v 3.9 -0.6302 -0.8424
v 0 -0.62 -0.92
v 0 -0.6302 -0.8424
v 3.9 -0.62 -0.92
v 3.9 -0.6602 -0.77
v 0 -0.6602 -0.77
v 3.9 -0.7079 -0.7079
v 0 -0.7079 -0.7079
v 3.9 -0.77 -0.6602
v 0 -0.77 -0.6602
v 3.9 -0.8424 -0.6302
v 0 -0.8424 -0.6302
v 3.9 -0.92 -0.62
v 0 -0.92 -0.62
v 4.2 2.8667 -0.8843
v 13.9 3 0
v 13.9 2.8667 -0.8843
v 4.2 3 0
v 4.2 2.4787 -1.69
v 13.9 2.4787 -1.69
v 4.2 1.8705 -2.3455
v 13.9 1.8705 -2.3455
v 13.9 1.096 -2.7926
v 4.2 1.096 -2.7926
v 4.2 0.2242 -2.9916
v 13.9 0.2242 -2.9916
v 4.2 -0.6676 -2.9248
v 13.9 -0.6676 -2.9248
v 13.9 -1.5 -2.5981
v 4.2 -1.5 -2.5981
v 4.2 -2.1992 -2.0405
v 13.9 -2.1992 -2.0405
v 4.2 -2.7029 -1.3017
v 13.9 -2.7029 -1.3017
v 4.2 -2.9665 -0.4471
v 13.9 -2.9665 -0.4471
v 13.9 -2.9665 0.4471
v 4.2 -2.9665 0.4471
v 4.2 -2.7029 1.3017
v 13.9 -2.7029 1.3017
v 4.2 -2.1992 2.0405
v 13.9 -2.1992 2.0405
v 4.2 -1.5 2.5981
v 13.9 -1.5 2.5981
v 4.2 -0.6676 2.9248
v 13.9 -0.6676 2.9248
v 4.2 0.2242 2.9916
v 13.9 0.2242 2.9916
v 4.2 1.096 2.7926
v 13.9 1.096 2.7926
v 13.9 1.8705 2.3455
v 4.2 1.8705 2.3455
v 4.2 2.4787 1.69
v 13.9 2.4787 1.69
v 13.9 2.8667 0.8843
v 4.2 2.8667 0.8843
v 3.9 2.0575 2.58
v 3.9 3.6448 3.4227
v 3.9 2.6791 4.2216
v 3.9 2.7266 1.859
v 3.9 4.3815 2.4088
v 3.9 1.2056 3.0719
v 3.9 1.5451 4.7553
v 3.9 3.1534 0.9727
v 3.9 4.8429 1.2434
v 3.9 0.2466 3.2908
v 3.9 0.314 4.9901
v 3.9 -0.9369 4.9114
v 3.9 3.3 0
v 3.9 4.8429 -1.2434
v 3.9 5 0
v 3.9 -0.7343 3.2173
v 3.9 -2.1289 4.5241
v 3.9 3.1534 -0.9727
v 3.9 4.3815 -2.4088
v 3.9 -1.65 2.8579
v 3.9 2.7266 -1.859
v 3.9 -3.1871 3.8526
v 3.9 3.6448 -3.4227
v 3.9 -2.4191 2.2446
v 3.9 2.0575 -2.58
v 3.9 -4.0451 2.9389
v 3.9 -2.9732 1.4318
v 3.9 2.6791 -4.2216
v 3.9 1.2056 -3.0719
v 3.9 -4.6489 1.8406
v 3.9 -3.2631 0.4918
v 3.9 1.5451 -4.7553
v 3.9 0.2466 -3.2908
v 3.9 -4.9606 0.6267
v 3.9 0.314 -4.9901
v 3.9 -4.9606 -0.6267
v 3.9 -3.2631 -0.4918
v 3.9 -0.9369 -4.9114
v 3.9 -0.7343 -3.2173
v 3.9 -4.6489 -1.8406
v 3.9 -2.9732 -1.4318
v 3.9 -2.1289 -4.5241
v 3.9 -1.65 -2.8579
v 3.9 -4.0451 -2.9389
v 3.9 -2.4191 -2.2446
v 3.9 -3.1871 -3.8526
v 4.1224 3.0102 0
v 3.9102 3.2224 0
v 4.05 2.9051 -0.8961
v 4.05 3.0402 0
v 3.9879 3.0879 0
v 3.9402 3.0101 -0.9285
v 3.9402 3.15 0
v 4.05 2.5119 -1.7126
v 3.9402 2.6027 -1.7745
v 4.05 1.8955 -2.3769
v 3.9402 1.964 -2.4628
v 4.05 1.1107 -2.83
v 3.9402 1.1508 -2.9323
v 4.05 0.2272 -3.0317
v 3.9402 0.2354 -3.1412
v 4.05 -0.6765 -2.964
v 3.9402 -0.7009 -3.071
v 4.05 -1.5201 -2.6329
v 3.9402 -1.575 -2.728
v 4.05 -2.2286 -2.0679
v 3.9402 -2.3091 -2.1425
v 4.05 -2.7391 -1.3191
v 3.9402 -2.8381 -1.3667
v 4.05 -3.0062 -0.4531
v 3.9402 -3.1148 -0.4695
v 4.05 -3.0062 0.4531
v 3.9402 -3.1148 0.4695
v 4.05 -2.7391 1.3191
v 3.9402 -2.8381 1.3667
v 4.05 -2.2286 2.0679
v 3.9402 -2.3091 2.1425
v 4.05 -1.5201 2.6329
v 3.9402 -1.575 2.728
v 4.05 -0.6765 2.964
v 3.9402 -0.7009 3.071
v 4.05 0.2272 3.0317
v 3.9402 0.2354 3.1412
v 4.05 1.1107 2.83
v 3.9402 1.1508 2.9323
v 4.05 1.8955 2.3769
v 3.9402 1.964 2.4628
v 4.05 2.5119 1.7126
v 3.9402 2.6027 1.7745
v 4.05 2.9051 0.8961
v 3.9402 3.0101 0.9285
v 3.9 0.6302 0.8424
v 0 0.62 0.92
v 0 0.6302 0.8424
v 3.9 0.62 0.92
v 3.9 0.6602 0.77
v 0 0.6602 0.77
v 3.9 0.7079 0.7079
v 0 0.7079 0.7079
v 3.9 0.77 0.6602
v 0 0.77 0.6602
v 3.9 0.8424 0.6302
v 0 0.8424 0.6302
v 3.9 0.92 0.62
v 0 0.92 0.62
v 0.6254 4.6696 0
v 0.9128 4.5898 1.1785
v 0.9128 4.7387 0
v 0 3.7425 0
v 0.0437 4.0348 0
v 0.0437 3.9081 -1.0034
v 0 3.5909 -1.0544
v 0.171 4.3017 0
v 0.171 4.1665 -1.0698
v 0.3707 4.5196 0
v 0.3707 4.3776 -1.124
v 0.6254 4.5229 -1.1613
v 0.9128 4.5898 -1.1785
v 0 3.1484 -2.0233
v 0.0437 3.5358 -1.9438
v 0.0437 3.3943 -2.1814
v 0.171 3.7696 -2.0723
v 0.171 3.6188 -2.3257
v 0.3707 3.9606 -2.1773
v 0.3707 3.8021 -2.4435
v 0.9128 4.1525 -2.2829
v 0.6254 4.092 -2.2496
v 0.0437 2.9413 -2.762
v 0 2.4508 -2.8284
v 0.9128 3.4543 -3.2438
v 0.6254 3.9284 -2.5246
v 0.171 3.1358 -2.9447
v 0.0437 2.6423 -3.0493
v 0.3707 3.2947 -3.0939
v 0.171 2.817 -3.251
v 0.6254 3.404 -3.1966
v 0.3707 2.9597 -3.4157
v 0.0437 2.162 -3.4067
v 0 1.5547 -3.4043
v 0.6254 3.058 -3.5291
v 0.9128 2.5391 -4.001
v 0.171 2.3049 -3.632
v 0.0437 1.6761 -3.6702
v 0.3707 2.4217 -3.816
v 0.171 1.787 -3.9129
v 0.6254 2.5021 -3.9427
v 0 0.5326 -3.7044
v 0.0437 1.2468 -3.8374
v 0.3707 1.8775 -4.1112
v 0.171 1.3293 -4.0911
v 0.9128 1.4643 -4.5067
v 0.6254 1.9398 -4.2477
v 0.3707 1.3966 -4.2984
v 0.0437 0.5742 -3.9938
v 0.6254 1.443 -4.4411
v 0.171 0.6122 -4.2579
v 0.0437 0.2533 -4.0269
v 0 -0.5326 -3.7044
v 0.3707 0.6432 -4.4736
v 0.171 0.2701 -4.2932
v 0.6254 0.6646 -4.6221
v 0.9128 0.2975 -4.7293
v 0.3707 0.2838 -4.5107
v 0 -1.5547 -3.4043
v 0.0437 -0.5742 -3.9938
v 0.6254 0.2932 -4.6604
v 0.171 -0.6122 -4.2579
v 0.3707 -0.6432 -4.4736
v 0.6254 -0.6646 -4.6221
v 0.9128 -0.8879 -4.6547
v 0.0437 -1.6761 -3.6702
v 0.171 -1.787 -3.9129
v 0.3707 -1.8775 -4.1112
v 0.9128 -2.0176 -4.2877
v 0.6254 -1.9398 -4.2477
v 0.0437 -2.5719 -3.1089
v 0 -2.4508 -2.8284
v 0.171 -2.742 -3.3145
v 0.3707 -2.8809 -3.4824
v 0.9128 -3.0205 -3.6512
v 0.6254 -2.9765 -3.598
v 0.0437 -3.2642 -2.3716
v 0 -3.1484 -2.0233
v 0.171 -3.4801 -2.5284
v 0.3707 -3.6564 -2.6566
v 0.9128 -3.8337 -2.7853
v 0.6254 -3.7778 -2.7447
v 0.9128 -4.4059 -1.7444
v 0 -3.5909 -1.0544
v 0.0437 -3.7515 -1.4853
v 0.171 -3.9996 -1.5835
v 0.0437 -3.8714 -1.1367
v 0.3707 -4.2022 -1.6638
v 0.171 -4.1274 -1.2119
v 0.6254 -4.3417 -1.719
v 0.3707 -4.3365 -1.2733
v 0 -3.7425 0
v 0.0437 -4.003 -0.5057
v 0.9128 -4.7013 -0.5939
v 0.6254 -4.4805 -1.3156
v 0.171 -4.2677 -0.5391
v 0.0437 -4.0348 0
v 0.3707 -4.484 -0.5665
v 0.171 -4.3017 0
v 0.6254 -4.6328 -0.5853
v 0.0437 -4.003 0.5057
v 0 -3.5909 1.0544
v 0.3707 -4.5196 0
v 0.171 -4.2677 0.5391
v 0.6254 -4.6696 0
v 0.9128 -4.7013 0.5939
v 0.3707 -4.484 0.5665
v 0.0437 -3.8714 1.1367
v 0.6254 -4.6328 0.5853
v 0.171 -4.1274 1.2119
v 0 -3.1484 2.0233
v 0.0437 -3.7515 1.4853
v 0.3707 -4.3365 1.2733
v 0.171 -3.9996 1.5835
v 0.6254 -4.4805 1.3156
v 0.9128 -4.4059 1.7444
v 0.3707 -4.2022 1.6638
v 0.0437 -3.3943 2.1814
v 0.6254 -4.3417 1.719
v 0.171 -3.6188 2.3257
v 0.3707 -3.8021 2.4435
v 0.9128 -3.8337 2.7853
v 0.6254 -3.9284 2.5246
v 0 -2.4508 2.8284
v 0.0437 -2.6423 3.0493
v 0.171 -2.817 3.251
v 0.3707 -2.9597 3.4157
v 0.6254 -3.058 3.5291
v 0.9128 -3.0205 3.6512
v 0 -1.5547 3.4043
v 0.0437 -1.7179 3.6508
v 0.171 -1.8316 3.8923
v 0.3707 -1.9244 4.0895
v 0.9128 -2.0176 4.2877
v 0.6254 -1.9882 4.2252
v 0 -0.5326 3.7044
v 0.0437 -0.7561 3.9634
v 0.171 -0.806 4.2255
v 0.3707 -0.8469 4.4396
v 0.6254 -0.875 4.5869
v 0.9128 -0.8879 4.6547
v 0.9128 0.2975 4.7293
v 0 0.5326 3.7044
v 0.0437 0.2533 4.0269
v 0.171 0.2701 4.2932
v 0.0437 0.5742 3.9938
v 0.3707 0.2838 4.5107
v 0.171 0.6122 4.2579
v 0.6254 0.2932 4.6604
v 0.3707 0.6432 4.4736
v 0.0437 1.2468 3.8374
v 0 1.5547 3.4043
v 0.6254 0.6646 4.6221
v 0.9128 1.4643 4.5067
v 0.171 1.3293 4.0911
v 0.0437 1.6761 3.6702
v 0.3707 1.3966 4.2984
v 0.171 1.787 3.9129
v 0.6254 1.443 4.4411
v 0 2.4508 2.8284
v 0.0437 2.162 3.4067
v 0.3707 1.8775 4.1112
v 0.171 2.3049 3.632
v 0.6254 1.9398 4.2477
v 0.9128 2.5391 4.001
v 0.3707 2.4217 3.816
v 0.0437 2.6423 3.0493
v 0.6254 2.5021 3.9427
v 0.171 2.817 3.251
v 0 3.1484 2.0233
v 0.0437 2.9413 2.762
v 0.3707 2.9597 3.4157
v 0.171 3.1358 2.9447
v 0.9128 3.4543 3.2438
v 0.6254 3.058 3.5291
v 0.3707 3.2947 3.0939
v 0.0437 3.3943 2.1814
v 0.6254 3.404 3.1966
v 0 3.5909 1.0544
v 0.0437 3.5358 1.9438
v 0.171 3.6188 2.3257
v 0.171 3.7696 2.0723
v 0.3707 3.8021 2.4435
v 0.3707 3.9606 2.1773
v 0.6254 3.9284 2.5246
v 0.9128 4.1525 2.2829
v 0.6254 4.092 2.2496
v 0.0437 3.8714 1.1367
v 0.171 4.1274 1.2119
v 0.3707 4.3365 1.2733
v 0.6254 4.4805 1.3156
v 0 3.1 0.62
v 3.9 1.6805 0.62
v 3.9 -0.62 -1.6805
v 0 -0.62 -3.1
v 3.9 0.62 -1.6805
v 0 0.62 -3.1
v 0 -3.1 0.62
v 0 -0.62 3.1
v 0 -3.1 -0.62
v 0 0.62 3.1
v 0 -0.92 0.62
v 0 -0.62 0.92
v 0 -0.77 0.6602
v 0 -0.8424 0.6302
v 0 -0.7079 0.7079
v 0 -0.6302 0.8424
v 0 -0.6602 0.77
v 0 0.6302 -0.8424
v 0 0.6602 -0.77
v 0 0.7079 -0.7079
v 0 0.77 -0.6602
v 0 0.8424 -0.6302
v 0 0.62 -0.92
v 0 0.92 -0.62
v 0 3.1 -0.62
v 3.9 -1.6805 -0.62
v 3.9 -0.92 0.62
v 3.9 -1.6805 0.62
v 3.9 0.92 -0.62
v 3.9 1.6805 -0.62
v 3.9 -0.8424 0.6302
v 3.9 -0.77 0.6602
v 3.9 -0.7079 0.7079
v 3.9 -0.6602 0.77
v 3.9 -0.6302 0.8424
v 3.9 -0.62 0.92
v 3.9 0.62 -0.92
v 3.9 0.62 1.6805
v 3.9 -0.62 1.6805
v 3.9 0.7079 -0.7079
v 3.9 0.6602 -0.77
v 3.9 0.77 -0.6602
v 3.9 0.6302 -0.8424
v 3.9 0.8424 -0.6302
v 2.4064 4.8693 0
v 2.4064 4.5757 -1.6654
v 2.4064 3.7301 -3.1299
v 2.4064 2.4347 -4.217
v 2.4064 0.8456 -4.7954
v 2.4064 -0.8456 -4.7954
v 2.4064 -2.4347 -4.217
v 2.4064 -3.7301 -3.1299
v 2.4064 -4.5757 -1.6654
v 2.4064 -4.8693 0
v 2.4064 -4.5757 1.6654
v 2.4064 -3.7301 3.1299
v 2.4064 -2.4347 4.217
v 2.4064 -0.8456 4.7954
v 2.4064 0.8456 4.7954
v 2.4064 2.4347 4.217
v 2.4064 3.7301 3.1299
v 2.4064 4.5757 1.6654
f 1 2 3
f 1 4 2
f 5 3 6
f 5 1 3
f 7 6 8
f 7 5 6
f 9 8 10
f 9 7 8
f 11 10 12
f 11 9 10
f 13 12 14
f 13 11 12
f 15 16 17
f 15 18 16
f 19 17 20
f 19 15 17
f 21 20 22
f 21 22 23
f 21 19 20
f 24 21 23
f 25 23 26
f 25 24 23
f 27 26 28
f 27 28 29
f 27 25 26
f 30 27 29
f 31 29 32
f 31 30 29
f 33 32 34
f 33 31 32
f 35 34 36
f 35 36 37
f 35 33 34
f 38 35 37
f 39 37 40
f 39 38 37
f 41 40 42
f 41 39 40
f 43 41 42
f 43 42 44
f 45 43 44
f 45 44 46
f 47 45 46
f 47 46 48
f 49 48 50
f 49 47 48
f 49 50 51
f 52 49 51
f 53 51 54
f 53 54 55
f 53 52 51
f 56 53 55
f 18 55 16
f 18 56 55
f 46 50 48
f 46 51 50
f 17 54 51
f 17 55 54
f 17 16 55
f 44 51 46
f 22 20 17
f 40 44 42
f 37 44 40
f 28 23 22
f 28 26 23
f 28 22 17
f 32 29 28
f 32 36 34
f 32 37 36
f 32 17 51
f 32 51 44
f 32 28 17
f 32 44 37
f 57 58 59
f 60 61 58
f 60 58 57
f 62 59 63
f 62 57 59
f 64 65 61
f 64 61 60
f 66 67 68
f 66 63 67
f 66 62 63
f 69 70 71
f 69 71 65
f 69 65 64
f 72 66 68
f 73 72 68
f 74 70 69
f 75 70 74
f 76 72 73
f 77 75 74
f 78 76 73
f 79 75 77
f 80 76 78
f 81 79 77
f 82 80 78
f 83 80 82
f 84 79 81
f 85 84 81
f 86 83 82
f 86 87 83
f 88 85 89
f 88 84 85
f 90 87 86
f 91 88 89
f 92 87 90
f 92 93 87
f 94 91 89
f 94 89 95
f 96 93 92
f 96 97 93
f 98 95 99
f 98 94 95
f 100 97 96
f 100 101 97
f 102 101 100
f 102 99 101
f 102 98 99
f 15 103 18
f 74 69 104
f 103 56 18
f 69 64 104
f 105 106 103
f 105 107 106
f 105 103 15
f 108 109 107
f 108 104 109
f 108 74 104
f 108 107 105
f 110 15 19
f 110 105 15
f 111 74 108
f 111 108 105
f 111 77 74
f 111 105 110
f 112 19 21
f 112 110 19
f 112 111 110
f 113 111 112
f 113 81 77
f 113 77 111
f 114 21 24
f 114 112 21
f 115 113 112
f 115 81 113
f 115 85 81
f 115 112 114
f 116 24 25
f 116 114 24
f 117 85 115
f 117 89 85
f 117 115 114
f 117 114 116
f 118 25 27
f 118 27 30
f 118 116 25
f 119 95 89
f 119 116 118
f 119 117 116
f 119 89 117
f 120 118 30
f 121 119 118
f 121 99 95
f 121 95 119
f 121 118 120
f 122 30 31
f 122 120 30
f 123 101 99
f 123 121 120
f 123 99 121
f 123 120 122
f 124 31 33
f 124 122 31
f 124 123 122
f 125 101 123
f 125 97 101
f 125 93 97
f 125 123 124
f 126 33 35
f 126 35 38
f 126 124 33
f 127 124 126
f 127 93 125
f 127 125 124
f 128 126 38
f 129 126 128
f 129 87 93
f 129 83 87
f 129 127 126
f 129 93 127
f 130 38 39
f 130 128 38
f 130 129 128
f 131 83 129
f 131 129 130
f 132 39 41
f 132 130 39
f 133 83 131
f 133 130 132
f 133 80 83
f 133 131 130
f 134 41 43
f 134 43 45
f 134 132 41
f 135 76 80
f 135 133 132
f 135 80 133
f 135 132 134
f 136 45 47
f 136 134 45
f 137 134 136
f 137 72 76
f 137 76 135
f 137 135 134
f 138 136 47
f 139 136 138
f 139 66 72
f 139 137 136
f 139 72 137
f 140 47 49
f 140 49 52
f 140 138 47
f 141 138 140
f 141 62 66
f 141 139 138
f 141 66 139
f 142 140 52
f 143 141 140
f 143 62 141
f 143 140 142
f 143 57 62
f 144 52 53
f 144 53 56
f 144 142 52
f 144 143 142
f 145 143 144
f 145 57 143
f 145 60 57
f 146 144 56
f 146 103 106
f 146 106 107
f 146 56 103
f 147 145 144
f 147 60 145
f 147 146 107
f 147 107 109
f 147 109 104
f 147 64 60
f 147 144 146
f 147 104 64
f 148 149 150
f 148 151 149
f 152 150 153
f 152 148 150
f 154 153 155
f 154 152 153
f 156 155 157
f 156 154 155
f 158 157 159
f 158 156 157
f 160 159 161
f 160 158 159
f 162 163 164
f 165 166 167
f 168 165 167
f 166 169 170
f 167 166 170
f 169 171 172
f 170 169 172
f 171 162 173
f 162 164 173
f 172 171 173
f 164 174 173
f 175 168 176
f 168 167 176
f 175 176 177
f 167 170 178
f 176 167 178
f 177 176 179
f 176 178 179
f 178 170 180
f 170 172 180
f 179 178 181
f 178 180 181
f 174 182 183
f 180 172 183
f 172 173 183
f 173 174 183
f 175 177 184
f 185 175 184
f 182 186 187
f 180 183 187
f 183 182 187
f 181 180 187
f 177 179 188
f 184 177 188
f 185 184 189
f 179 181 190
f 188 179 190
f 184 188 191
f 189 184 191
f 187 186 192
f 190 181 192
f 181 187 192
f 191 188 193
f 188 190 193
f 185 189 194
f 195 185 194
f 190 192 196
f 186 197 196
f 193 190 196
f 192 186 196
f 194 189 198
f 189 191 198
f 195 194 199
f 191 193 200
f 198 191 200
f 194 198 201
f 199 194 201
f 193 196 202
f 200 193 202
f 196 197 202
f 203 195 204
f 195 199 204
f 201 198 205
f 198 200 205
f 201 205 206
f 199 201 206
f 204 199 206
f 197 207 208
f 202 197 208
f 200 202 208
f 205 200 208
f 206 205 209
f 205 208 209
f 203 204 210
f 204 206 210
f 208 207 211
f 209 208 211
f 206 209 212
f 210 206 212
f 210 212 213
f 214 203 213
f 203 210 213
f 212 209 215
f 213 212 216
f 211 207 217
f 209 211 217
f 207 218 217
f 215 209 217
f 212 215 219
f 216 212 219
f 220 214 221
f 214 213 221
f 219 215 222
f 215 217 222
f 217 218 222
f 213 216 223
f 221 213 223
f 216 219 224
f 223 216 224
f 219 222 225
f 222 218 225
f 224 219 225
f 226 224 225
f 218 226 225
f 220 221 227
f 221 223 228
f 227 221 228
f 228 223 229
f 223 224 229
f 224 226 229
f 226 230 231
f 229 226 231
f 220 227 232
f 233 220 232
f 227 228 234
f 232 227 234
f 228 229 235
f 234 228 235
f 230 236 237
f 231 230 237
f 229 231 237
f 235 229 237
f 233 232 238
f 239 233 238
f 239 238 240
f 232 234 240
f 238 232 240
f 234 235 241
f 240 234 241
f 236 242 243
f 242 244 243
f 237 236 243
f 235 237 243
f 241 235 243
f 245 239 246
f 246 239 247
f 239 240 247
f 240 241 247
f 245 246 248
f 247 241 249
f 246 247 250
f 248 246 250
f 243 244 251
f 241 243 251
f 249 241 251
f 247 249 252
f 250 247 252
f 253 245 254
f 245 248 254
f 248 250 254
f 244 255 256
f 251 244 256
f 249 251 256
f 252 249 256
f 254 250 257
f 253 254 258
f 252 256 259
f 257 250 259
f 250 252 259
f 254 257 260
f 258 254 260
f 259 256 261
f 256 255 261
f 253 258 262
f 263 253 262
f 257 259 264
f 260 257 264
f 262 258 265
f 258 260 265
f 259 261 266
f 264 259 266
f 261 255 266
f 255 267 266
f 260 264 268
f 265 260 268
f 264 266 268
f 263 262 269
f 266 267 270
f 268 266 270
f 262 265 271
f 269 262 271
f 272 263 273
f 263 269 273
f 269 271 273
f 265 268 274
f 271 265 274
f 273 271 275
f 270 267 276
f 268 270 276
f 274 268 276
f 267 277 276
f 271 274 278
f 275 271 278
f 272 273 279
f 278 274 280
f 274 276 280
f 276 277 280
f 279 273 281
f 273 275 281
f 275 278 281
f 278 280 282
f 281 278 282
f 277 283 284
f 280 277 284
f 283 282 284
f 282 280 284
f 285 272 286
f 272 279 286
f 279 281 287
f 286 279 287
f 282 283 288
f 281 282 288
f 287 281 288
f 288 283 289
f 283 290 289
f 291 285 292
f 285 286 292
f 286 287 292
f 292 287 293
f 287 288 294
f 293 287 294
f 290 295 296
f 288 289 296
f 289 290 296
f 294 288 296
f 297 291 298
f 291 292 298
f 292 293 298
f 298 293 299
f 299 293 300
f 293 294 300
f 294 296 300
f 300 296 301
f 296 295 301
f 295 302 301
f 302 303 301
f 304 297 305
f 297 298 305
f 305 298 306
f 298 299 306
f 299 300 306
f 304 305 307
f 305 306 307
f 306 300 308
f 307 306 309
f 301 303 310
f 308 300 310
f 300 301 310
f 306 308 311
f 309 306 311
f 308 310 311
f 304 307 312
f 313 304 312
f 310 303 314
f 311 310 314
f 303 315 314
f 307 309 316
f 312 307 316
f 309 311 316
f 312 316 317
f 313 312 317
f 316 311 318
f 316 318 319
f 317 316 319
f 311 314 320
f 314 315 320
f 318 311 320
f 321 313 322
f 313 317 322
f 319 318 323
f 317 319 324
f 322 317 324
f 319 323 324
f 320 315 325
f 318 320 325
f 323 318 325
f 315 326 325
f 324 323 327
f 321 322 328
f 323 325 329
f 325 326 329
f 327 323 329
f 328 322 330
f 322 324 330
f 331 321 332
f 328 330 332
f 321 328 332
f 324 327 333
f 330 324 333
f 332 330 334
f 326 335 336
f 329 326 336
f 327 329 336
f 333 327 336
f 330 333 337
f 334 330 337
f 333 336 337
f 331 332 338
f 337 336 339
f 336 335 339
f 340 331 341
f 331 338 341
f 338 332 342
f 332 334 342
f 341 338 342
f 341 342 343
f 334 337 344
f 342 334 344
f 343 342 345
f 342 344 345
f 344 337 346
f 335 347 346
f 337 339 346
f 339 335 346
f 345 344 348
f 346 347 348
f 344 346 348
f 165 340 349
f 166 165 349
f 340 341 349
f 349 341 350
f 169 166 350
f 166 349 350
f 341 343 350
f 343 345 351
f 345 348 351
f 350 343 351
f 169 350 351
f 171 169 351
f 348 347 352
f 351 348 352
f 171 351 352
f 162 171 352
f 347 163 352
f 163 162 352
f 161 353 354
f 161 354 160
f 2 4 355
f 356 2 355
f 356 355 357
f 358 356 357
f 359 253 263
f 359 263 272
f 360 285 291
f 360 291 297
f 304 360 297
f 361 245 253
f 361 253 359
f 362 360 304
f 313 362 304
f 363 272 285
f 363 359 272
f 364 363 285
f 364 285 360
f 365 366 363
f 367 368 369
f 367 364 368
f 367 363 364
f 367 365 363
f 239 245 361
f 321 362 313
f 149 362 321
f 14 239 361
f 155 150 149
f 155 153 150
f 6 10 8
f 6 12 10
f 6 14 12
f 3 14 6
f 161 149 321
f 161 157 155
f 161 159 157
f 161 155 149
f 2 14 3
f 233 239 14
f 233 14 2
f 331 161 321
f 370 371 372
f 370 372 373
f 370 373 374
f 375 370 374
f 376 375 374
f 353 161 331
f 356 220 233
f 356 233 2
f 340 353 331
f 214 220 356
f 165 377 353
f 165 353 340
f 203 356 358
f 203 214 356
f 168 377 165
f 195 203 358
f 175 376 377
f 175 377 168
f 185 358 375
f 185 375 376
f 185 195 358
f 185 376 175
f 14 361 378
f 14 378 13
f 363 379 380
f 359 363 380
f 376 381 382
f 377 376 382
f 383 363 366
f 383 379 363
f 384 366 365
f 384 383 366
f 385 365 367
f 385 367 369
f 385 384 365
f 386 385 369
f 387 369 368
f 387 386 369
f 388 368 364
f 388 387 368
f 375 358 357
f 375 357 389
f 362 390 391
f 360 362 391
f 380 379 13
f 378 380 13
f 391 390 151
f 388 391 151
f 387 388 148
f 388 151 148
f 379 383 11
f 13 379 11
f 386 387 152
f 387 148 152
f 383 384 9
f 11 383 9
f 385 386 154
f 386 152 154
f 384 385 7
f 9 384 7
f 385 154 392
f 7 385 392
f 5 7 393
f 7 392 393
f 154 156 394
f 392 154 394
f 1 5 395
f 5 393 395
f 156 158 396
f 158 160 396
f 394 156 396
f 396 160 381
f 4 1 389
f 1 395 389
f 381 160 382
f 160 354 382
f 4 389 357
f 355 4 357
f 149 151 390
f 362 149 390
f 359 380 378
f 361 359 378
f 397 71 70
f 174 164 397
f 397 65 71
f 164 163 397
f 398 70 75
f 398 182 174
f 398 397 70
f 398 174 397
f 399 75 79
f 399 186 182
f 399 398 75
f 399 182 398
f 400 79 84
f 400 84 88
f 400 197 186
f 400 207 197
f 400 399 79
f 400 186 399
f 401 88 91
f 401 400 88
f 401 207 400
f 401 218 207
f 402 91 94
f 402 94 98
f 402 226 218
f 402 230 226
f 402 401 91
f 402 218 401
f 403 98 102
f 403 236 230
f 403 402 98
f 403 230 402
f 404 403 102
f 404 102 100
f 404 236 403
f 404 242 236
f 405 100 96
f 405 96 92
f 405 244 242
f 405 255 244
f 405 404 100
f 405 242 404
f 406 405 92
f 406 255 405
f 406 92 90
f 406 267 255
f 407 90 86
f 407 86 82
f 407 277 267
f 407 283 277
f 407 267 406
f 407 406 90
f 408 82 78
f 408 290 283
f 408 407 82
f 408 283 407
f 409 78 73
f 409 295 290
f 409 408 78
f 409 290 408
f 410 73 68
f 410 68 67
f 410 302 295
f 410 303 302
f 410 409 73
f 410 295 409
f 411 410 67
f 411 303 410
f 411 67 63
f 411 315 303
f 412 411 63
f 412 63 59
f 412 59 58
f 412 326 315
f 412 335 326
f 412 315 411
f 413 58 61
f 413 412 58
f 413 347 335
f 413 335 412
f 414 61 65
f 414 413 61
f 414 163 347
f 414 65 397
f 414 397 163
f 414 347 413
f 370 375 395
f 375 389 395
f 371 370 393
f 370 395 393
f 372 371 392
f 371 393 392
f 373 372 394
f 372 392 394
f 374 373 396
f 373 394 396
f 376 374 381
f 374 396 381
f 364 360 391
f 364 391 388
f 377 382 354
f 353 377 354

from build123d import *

# Parameters (mm, degrees)
CROSSRECESS_DEPTH = 3.9
FILLET5_R         = 0.3
HEADFILLET_R      = 1
DRAFT1_ANGLE      = 20


with BuildPart() as part:
    # Sketch1 → Base (revolve)
    with BuildSketch(Plane.XY):
        with BuildLine():
            Line((13.9, 3), (5.9, 3))
            Line((5.9, 3), (4.2, 3))
            ThreePointArc((4.2, 3), (3.987867966, 3.087867966), (3.9, 3.3))
            Line((3.9, 3.3), (3.9, 5))
            Line((3.9, 5), (0, 4.658794212))
            Line((0, 4.658794212), (0, 0))
            Line((0, 0), (13.9, 0))
            Line((13.9, 0), (13.9, 3))
        make_face()
    revolve(axis=Axis((4.515812911, 0, 0), (-1, 0, 0)))

    # Sketch6 → CrossRecess (cut)
    with BuildSketch(Plane(origin=(0, 0, 0), x_dir=(0, 0, -1), z_dir=(1, 0, 0))):
        Polygon((0.62, 0.62), (0.62, 3.1), (-0.62, 3.1), (-0.62, 0.62), (-3.1, 0.62), (-3.1, -0.62), (-0.62, -0.62), (-0.62, -3.1), (0.62, -3.1), (0.62, -0.62), (3.1, -0.62), (3.1, 0.62), align=None)
    extrude(amount=CROSSRECESS_DEPTH, mode=Mode.SUBTRACT)

    # Fillet5
    fillet5_edges = [part.edges().sort_by_distance(p)[0] for p in [
        (1.95, 0.62, 0.62),
        (1.95, -0.62, 0.62),
        (1.95, -0.62, -0.62),
        (1.95, 0.62, -0.62),
    ]]
    fillet(fillet5_edges, radius=FILLET5_R)

    # HeadFillet
    headfillet_edges = [part.edges().sort_by_distance(p)[0] for p in [
        (0, -4.658794212, 0),
    ]]
    fillet(headfillet_edges, radius=HEADFILLET_R)

    # Draft1
    draft1_faces = [part.faces().sort_by_distance(p)[0] for p in [
        (1.95, 0, 3.1),
        (1.95, -3.1, 0),
        (1.95, 0, -3.1),
        (1.95, 3.1, 0),
    ]]
    draft(draft1_faces, Plane(origin=(0, 0, 0), x_dir=(0, 0, -1), z_dir=(-1, 0, 0)), DRAFT1_ANGLE)


solid = part.part
